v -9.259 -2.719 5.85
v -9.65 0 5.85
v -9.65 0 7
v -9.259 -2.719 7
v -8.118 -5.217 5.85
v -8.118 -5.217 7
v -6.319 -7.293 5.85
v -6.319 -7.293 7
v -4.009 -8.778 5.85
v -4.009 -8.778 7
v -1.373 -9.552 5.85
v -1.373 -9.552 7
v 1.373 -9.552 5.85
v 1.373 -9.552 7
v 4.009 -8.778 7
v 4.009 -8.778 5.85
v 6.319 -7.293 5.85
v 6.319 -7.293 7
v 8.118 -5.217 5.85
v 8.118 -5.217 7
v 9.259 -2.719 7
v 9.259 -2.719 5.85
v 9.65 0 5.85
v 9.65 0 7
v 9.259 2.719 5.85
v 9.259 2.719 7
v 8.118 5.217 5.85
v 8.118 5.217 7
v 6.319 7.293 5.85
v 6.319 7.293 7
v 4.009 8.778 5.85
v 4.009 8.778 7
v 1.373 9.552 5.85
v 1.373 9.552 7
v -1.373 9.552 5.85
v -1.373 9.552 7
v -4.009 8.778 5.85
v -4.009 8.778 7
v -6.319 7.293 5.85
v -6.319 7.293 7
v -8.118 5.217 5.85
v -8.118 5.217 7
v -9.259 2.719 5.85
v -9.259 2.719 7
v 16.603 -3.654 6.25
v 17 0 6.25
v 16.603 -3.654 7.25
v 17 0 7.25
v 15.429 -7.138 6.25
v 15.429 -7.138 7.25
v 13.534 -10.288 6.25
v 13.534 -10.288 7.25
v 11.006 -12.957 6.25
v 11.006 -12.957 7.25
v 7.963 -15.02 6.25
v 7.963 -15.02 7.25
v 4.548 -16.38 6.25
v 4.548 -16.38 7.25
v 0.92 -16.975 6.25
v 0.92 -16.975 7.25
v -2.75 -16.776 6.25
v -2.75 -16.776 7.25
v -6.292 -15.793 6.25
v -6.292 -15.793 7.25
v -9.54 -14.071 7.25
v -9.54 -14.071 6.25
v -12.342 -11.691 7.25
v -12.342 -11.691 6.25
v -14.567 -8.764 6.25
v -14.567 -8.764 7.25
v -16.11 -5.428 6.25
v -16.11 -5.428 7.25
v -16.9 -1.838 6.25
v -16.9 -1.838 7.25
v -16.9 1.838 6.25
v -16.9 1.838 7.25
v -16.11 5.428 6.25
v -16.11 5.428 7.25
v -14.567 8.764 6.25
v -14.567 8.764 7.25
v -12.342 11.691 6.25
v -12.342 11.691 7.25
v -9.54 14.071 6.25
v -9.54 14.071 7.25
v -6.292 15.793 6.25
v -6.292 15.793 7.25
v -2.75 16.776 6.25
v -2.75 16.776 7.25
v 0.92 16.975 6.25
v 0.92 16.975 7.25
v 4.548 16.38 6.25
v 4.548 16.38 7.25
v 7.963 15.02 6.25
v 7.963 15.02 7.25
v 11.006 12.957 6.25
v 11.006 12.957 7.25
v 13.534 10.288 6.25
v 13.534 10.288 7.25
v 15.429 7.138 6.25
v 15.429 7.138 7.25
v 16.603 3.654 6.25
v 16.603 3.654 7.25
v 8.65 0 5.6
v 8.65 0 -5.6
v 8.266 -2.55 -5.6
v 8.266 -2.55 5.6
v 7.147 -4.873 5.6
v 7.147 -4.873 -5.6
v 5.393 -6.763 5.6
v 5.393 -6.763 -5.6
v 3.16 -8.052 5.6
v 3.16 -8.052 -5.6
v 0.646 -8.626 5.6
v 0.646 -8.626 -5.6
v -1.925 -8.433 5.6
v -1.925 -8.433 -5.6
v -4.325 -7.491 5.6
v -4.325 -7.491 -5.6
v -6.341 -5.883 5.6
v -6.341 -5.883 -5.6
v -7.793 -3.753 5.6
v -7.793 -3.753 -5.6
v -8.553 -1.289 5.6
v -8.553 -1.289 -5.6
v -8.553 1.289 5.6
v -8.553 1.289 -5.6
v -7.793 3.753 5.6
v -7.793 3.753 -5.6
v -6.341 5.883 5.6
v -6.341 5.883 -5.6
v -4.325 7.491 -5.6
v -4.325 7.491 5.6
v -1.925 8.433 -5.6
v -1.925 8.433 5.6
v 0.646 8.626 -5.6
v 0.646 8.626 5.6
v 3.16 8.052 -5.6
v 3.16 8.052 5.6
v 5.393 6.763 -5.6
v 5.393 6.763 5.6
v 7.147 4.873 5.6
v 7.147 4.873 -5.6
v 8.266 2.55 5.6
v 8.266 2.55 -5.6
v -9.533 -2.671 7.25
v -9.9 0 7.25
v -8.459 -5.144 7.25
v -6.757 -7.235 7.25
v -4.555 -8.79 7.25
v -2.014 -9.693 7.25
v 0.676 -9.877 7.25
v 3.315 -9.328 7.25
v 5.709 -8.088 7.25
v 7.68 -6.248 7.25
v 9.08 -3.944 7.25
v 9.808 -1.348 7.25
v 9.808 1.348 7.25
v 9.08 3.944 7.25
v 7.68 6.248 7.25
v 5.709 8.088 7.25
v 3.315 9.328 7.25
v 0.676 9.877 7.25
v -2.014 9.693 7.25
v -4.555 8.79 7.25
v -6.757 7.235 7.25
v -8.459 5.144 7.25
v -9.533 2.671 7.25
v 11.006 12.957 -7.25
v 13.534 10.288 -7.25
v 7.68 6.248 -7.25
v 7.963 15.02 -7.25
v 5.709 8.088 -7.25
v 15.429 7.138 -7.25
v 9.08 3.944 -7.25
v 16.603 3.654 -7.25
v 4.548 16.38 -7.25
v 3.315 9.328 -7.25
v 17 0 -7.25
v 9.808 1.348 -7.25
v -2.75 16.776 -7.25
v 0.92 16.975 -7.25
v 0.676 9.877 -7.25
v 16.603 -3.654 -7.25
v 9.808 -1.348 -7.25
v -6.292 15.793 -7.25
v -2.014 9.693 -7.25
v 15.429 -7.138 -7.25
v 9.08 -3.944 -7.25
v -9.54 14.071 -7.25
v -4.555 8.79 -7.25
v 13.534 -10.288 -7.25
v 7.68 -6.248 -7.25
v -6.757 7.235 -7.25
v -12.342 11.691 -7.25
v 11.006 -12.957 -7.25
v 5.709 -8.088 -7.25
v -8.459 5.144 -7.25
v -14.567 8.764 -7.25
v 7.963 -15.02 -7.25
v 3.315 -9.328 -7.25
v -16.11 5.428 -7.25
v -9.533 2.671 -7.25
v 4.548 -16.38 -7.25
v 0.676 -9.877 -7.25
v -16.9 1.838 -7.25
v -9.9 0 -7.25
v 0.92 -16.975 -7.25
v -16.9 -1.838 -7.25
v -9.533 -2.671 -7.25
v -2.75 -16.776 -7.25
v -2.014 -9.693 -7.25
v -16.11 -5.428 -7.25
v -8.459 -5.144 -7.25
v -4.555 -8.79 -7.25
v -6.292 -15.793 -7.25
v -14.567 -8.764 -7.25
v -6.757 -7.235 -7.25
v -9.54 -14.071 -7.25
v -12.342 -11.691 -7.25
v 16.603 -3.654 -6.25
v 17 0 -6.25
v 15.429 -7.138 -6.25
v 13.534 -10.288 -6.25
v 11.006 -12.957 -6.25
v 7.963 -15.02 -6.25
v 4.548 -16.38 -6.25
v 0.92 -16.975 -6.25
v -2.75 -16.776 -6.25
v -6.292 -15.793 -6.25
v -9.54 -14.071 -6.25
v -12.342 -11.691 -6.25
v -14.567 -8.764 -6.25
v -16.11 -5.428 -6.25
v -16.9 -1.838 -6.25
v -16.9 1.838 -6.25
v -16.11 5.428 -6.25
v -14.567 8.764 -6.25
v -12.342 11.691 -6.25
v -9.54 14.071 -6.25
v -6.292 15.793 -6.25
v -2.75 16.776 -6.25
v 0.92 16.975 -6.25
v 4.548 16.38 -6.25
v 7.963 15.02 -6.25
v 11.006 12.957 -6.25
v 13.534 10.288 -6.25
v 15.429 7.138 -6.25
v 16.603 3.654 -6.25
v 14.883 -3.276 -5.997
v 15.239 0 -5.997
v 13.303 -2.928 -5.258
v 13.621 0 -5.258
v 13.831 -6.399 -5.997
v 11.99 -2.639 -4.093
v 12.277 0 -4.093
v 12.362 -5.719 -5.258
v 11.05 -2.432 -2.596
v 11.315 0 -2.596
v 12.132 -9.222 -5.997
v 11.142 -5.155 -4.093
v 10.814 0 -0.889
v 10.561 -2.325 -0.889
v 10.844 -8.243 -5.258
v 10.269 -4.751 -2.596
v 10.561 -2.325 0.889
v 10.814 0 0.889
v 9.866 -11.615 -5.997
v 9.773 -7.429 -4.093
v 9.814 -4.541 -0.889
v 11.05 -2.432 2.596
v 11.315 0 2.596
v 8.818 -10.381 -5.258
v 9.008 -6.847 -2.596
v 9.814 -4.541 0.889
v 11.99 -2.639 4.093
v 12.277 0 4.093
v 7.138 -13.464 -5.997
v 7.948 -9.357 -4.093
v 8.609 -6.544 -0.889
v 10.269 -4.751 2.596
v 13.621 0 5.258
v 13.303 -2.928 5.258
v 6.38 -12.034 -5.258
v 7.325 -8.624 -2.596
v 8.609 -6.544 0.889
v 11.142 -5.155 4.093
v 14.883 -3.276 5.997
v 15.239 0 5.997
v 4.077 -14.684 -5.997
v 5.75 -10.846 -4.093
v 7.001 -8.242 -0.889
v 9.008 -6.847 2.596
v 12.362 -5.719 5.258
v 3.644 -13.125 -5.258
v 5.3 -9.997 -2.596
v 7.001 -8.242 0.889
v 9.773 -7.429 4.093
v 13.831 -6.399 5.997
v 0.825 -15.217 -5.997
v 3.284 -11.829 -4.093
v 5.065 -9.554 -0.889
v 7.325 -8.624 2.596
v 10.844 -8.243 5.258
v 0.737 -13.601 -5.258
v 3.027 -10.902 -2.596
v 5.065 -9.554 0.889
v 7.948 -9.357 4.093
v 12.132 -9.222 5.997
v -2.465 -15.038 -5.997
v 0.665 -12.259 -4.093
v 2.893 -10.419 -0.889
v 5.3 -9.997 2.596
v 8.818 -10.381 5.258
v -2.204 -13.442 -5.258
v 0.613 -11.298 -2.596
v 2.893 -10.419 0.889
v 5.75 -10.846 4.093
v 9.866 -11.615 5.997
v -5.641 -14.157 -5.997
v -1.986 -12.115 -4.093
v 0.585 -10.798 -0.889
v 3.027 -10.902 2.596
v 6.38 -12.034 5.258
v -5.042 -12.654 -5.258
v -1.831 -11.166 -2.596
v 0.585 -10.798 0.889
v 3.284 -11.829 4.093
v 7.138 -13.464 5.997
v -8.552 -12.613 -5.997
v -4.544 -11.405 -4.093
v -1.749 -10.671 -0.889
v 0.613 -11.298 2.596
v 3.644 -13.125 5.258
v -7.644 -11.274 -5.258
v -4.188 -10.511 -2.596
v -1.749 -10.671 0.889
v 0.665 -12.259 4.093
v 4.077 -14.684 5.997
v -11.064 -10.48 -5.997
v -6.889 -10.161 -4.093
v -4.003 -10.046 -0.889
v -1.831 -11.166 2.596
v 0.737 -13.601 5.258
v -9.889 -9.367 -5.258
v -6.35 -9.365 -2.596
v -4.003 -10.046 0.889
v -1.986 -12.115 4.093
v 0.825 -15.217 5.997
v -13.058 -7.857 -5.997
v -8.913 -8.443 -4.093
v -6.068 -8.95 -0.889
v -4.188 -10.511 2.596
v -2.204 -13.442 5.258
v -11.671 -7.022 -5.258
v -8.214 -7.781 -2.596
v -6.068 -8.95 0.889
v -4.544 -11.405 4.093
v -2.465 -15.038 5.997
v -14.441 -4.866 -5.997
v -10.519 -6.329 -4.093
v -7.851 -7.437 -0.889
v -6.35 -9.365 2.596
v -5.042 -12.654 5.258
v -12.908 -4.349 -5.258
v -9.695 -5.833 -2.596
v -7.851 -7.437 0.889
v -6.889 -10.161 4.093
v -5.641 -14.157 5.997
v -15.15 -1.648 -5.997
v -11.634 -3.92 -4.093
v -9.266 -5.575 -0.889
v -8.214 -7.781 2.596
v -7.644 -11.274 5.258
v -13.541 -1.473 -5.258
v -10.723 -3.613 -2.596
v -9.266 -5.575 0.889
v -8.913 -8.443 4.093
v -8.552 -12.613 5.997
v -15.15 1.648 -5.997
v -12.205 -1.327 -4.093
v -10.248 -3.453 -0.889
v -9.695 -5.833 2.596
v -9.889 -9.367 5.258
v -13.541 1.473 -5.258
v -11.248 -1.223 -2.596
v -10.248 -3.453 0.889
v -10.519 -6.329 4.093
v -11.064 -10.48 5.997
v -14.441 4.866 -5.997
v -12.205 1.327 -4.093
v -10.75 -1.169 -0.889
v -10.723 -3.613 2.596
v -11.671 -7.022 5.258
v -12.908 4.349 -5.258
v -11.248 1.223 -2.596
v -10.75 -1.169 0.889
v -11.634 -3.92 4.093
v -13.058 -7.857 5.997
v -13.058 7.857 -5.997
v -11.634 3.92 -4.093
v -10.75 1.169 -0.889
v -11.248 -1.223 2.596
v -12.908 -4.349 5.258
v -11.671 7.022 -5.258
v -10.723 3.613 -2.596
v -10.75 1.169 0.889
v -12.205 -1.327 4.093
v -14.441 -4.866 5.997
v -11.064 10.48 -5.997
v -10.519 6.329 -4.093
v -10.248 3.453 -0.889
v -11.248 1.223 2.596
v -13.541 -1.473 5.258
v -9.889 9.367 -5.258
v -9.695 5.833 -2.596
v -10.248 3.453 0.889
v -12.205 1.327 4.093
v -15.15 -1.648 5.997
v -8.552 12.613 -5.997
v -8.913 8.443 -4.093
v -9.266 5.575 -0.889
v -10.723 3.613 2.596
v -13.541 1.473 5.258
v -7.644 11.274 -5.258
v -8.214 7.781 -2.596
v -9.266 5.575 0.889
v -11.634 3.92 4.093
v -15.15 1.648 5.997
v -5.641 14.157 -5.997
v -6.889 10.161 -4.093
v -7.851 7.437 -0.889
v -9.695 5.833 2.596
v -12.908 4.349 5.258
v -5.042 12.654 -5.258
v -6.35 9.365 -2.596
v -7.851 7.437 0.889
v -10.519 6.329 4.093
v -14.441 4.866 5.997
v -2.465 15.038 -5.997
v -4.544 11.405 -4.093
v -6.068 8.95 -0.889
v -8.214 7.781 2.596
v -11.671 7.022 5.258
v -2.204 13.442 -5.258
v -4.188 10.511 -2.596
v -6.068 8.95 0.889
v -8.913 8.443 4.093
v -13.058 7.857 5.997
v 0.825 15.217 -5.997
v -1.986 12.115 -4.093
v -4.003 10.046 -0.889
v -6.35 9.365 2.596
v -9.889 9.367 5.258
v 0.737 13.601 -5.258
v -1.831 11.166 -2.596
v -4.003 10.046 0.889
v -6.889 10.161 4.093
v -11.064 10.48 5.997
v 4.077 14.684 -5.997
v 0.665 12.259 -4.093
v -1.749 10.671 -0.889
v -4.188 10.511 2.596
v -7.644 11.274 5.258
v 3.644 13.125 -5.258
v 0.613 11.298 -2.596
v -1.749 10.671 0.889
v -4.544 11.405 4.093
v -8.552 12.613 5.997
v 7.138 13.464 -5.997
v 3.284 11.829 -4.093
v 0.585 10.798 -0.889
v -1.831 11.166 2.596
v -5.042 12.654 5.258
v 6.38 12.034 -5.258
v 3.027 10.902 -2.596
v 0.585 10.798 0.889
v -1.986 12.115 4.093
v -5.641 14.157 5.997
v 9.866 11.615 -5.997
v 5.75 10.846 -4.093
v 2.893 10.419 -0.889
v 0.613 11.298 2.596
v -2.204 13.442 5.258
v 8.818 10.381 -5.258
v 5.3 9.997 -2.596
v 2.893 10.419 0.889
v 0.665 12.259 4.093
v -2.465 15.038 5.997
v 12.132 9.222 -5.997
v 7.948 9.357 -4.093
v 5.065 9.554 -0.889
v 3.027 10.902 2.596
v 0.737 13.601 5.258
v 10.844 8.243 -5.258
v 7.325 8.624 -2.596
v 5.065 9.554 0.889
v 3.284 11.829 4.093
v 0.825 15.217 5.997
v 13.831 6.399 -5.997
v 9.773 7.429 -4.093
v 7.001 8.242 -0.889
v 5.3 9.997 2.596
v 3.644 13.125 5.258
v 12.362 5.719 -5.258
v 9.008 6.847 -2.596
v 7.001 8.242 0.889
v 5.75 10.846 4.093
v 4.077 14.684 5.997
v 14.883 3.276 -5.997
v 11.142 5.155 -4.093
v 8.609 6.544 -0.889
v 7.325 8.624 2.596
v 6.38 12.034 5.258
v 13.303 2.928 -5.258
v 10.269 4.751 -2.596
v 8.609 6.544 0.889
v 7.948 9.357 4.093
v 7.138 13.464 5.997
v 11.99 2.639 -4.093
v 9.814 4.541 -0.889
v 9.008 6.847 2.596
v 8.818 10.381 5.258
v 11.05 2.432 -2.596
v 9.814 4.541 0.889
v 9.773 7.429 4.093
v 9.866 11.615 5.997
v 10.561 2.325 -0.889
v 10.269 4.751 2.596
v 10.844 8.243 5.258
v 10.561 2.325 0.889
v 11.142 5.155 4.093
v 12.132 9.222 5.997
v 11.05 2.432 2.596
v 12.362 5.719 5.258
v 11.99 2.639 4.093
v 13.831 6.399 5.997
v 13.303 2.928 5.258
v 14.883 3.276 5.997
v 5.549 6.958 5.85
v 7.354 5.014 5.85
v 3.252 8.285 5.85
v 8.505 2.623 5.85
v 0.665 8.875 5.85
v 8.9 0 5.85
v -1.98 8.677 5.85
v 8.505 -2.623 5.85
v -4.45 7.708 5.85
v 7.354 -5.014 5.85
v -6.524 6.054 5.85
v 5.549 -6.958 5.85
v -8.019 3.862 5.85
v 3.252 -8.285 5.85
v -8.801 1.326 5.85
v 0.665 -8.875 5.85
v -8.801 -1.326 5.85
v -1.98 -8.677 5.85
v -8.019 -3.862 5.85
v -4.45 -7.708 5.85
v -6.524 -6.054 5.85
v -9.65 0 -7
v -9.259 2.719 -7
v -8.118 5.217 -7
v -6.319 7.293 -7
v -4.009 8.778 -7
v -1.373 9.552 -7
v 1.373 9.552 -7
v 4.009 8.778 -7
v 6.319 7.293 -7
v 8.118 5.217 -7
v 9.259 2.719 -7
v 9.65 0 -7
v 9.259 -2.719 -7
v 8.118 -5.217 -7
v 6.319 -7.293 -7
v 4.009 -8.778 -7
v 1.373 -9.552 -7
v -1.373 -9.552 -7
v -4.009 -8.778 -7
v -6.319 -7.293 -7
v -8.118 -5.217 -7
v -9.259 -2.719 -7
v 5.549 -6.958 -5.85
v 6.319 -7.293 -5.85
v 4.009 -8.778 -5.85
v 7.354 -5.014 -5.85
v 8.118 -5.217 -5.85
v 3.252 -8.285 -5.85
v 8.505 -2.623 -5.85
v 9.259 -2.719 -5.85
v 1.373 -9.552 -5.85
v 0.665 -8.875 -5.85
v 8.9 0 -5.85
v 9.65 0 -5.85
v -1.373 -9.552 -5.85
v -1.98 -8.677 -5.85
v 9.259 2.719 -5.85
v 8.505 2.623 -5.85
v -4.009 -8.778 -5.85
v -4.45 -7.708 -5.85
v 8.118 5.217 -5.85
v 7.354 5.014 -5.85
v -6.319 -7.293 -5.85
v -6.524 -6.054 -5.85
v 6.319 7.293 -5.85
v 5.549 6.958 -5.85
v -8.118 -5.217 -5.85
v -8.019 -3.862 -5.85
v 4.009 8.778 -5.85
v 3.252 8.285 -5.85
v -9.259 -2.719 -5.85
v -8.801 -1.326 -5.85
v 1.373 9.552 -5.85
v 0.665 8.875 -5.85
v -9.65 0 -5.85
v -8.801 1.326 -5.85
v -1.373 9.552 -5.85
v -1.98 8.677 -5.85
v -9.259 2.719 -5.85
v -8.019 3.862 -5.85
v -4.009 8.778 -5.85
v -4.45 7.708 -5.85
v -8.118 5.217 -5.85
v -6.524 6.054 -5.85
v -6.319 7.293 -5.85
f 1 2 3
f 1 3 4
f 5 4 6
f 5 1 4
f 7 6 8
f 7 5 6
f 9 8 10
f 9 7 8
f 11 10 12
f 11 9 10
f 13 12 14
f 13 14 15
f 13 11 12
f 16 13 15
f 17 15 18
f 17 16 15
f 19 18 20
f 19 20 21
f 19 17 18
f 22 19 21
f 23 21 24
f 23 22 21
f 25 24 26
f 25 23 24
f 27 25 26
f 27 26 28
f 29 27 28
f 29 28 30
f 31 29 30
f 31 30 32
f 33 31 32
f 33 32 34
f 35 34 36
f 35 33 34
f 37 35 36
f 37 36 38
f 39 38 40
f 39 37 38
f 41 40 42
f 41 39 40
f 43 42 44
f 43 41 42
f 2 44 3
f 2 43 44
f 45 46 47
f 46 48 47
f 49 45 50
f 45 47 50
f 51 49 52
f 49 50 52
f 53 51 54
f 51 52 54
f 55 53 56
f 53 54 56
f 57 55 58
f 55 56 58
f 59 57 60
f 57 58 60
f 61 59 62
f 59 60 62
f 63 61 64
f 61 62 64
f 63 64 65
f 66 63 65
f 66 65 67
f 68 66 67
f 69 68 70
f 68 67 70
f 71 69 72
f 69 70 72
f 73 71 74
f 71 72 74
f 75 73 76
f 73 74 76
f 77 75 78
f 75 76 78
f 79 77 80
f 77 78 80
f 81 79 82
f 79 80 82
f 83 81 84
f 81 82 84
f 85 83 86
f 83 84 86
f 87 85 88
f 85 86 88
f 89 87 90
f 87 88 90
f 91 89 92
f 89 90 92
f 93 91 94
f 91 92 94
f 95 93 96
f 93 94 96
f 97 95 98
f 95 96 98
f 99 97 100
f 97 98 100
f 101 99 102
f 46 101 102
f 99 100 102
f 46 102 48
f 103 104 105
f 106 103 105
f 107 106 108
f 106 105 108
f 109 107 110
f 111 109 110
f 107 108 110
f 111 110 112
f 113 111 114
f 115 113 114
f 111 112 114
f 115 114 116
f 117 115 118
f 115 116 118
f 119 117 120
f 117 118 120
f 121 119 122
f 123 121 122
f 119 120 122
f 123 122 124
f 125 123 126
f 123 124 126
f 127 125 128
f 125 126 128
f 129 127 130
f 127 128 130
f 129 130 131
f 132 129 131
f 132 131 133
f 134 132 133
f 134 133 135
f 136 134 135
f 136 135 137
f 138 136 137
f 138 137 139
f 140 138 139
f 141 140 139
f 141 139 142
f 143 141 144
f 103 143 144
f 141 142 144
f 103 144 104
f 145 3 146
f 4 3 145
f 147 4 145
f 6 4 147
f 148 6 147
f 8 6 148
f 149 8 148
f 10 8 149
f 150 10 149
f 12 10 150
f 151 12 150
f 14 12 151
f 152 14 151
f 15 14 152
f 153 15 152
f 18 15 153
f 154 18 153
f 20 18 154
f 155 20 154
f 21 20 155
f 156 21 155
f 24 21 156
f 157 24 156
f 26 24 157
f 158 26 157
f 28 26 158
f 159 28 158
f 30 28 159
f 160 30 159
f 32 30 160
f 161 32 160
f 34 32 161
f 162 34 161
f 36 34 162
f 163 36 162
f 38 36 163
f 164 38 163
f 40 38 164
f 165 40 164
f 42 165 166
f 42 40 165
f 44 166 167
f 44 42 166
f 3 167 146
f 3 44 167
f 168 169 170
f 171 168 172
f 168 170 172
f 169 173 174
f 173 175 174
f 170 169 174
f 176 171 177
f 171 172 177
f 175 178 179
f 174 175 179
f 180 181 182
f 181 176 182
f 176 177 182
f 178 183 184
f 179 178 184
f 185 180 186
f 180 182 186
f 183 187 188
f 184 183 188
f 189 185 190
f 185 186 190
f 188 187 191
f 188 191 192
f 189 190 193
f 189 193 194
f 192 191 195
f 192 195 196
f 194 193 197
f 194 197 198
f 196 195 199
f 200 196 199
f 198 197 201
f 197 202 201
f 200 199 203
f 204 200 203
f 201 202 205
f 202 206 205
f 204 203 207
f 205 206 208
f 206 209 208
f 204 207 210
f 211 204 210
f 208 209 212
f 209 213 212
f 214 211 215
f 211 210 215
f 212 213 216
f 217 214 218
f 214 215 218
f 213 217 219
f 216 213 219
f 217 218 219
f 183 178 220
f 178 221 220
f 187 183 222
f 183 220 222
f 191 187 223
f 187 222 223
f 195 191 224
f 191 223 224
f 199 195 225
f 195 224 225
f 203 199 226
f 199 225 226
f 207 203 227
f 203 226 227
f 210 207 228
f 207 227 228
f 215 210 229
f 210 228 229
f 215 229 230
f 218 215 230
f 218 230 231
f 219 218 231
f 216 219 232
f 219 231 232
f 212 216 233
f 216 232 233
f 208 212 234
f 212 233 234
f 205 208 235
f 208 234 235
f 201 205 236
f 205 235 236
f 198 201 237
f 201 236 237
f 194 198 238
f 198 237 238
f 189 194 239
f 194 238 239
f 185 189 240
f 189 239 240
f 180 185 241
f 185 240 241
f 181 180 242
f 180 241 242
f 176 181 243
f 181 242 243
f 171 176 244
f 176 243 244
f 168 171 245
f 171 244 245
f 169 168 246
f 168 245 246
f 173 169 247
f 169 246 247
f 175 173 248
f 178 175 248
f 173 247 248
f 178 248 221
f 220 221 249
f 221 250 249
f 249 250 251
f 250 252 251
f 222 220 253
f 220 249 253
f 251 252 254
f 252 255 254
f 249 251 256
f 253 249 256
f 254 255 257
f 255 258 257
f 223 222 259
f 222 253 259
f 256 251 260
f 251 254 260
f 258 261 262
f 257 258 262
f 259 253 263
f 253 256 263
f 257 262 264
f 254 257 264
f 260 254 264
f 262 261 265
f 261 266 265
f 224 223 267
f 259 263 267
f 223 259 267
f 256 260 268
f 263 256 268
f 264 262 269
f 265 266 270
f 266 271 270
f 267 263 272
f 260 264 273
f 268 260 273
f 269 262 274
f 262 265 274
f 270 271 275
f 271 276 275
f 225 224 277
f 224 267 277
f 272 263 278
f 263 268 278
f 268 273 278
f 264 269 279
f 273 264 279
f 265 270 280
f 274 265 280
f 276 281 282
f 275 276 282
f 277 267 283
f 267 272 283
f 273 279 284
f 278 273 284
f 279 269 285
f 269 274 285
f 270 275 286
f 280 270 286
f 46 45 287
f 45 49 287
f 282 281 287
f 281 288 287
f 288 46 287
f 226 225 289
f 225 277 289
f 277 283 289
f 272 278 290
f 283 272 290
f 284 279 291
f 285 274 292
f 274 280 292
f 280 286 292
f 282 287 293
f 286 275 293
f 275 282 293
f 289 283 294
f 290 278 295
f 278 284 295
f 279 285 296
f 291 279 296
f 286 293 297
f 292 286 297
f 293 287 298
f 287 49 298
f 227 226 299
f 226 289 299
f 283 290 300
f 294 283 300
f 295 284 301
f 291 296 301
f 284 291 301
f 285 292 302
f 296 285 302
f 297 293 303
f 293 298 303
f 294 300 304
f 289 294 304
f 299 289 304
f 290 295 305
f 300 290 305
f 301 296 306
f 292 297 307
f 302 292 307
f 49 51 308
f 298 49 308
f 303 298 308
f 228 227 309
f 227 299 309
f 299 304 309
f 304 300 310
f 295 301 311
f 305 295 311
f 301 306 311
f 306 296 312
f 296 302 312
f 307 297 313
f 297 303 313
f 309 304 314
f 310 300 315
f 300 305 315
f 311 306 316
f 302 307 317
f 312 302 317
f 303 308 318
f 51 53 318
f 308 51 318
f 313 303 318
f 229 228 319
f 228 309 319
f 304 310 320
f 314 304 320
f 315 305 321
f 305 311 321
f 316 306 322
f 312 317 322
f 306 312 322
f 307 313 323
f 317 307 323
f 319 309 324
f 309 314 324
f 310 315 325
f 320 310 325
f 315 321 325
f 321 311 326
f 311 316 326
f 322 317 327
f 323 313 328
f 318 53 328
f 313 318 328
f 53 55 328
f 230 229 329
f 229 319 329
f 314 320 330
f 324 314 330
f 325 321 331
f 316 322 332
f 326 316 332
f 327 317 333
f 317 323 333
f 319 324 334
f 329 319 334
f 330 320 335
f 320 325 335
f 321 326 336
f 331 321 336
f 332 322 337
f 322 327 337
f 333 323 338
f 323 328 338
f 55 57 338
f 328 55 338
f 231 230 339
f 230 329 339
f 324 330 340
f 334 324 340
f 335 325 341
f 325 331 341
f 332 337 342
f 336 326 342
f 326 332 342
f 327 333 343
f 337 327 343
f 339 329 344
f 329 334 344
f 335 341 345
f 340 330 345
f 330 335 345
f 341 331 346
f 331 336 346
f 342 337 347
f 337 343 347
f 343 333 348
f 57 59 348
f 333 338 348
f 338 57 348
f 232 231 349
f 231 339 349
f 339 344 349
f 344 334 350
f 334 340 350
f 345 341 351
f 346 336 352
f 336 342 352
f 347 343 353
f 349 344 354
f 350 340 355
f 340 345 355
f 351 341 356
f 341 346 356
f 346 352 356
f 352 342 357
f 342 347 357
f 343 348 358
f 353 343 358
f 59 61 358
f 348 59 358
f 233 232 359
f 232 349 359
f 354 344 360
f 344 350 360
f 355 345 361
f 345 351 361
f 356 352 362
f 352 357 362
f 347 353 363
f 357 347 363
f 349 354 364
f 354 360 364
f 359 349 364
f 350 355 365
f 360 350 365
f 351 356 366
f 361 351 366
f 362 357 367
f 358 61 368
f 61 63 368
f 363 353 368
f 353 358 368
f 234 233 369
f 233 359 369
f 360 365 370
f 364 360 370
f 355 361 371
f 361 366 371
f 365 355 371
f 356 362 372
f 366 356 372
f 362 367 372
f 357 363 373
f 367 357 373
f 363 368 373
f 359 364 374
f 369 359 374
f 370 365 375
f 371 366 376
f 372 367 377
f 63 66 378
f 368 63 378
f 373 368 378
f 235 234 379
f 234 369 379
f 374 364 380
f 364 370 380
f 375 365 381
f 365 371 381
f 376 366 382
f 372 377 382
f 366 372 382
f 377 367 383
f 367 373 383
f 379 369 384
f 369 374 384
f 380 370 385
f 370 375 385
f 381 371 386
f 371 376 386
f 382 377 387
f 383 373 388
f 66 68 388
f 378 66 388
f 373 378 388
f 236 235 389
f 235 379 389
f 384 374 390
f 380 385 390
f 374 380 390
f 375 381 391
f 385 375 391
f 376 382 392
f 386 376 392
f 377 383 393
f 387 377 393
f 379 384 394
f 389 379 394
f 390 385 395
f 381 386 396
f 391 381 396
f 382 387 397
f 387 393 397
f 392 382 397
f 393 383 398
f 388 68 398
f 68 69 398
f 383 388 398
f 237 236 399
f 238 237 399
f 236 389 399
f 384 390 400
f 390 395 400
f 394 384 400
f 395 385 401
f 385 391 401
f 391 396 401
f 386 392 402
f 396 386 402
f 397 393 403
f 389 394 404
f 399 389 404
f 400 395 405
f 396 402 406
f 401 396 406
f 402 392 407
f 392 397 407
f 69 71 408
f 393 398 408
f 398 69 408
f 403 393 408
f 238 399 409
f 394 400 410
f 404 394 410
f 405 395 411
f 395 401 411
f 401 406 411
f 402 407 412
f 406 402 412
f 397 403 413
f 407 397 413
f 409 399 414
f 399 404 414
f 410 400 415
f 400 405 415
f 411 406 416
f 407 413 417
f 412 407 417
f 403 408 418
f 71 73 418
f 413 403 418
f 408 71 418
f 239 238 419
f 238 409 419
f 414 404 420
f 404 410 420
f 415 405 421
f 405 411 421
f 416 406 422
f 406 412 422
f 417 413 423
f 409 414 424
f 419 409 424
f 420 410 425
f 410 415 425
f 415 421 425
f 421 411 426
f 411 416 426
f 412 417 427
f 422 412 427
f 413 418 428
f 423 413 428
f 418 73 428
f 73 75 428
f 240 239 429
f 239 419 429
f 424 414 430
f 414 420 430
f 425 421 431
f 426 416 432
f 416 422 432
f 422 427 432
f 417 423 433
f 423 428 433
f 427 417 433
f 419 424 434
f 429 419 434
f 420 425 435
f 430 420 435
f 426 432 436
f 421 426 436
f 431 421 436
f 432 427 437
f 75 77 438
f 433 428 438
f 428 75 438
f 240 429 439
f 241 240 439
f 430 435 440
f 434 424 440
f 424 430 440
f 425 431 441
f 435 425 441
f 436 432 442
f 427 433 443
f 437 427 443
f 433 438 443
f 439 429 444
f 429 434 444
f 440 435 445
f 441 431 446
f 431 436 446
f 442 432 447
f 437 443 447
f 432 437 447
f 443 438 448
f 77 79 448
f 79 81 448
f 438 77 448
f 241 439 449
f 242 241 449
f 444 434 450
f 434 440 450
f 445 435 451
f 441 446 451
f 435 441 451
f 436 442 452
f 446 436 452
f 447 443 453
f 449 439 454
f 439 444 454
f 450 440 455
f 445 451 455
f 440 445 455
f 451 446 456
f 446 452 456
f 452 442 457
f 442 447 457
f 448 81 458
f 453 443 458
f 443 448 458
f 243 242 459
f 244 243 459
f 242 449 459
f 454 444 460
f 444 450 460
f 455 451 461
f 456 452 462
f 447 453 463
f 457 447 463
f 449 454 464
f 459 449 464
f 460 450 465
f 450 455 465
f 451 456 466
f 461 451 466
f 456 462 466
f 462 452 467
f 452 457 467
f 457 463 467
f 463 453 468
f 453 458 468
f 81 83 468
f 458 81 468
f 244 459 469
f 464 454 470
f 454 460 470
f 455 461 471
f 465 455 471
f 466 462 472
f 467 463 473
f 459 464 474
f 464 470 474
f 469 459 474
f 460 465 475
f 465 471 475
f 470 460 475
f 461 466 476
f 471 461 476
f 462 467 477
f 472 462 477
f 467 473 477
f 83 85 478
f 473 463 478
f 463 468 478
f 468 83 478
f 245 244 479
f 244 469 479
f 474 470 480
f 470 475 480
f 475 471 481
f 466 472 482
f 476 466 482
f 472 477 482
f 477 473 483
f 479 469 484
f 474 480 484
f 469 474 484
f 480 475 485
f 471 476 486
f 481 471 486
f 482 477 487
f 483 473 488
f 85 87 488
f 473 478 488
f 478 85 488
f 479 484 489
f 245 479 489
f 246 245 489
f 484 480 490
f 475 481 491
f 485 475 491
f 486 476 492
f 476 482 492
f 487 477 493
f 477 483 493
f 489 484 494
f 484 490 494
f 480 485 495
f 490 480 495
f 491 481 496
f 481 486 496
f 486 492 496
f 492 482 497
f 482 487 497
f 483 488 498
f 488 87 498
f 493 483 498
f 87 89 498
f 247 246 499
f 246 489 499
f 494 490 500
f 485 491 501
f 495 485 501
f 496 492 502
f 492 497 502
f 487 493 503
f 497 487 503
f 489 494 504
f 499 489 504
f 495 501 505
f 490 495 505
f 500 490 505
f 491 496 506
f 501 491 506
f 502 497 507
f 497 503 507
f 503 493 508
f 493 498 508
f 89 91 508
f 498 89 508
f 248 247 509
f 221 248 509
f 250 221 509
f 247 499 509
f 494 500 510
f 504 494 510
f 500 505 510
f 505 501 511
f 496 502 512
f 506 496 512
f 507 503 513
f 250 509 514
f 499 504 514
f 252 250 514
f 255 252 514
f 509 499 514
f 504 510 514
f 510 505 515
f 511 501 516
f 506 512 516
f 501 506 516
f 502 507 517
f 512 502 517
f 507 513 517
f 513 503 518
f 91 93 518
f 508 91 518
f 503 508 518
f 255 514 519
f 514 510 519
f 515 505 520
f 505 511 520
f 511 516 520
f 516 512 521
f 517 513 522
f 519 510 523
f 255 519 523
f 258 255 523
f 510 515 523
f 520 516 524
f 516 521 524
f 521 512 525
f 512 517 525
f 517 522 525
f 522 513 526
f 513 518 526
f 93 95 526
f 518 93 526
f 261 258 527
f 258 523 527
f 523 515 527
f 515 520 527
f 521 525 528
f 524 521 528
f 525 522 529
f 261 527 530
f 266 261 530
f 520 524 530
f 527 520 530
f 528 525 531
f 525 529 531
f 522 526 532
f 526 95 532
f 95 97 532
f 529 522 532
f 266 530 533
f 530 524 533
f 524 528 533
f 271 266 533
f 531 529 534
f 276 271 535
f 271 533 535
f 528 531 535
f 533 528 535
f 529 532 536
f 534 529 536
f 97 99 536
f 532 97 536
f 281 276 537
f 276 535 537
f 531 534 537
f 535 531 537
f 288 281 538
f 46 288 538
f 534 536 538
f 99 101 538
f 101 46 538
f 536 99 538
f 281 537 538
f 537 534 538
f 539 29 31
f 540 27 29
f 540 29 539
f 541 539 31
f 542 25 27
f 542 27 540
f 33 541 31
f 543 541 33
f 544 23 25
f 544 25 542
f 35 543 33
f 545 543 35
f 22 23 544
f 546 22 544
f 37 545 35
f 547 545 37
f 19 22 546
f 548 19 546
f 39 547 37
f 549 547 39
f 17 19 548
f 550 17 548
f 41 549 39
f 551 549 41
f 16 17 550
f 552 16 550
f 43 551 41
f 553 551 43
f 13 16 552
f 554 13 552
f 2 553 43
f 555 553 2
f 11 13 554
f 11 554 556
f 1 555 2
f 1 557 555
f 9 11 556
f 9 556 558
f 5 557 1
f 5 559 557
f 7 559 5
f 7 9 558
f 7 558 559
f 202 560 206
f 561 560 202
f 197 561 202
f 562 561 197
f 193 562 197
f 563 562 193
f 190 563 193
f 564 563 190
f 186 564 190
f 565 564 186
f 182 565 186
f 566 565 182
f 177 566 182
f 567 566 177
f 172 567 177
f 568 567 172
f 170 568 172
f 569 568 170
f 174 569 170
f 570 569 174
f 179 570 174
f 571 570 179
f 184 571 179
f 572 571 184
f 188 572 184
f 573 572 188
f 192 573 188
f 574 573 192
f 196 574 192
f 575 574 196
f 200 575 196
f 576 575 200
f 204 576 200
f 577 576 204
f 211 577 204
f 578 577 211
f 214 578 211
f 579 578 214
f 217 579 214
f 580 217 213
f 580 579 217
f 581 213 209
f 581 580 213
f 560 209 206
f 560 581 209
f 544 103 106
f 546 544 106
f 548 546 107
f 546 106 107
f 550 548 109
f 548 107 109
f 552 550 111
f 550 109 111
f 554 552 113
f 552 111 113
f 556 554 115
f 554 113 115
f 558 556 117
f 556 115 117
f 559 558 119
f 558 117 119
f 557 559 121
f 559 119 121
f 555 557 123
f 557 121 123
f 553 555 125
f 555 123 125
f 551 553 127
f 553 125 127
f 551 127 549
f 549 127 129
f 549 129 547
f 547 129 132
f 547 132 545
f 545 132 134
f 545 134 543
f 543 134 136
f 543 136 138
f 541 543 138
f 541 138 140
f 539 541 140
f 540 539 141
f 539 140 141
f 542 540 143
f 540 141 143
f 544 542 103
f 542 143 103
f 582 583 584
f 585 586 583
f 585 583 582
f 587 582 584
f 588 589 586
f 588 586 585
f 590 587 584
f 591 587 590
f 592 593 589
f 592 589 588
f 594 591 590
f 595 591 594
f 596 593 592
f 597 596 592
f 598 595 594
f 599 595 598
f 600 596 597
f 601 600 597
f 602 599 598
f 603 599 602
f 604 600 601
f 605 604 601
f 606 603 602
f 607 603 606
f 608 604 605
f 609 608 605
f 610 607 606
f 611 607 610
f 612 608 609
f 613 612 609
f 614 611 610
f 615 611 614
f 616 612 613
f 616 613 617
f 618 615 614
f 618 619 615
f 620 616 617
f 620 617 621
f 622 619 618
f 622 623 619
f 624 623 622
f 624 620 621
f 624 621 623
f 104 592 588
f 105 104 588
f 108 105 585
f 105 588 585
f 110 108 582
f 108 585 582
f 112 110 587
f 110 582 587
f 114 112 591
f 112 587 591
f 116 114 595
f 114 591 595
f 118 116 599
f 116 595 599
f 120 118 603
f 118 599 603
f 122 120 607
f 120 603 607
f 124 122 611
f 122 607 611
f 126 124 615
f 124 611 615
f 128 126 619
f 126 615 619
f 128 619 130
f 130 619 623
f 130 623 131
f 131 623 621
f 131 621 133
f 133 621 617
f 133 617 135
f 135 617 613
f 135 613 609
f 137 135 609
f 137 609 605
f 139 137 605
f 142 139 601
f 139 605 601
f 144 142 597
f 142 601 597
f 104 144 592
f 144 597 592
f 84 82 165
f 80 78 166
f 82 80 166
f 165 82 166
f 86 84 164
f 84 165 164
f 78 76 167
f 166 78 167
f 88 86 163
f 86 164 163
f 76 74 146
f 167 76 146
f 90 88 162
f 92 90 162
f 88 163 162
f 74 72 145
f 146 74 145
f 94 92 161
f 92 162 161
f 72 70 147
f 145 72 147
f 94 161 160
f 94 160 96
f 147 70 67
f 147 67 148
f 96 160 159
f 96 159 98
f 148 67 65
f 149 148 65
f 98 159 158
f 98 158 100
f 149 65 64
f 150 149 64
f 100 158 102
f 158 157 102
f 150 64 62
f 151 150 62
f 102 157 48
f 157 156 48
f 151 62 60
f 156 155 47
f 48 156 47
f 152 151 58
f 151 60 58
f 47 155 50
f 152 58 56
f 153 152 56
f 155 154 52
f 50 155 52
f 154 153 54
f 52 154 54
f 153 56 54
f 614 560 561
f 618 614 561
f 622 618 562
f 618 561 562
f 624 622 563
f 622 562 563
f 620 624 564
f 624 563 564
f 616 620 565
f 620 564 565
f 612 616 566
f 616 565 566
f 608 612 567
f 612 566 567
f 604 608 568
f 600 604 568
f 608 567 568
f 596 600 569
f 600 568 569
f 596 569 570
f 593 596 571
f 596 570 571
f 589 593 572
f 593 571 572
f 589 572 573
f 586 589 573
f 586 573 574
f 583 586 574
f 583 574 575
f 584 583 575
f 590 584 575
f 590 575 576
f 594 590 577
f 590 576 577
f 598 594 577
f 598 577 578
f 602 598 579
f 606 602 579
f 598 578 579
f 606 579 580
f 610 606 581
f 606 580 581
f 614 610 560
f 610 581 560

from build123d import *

# Parameters (mm, degrees)
SKETCH2_R          = 9.65
CUT_EXTRUDE1_DEPTH = 1.4
CUT_EXTRUDE2_START = -1.4
SKETCH3_R          = 9.65
CUT_EXTRUDE2_DEPTH = 1.4
CHAMFER1_SIZE      = 0.25


with BuildPart() as part:
    # Sketch1 → Revolve1 (revolve)
    with BuildSketch(Plane(origin=(0, 0, 0), x_dir=(0, 0, -1), z_dir=(1, 0, 0)), mode=Mode.PRIVATE) as revolve1_sk:
        with BuildLine():
            Line((-6.25, 17), (-7.25, 17))
            Line((-7.25, 17), (-7.25, 8.65))
            Line((-7.25, 8.65), (7.25, 8.65))
            Line((7.25, 8.65), (7.25, 17))
            Line((7.25, 17), (6.25, 17))
            ThreePointArc((6.25, 17), (0, 10.75), (-6.25, 17))
        make_face()
    revolve(revolve1_sk.sketch.rotate(Axis((0, 0, 64.980952982), (0, 0, -1)), 90), axis=Axis((0, 0, 64.980952982), (0, 0, -1)))

    # Sketch2 → Cut-Extrude1 (cut)
    with BuildSketch(Plane(origin=(0, 0, -7.25), x_dir=(-1, 0, 0), z_dir=(0, 0, -1))):
        Circle(SKETCH2_R)
    extrude(amount=-CUT_EXTRUDE1_DEPTH, mode=Mode.SUBTRACT)

    # Sketch3 → Cut-Extrude2 (cut)
    with BuildSketch(Plane.XY.offset(7.25).offset(CUT_EXTRUDE2_START)):
        with Locations(Location((0, 0, 0), (0, 0, 180))):
            Circle(SKETCH3_R)
    extrude(amount=CUT_EXTRUDE2_DEPTH, mode=Mode.SUBTRACT)

    # Chamfer1
    chamfer1_edges = [part.edges().sort_by_distance(p)[0] for p in [
        (9.65, 0, -7.25),
        (-8.65, 0, -5.85),
        (9.65, 0, 7.25),
        (-8.65, 0, 5.85),
    ]]
    chamfer(chamfer1_edges, length=CHAMFER1_SIZE)


solid = part.part
